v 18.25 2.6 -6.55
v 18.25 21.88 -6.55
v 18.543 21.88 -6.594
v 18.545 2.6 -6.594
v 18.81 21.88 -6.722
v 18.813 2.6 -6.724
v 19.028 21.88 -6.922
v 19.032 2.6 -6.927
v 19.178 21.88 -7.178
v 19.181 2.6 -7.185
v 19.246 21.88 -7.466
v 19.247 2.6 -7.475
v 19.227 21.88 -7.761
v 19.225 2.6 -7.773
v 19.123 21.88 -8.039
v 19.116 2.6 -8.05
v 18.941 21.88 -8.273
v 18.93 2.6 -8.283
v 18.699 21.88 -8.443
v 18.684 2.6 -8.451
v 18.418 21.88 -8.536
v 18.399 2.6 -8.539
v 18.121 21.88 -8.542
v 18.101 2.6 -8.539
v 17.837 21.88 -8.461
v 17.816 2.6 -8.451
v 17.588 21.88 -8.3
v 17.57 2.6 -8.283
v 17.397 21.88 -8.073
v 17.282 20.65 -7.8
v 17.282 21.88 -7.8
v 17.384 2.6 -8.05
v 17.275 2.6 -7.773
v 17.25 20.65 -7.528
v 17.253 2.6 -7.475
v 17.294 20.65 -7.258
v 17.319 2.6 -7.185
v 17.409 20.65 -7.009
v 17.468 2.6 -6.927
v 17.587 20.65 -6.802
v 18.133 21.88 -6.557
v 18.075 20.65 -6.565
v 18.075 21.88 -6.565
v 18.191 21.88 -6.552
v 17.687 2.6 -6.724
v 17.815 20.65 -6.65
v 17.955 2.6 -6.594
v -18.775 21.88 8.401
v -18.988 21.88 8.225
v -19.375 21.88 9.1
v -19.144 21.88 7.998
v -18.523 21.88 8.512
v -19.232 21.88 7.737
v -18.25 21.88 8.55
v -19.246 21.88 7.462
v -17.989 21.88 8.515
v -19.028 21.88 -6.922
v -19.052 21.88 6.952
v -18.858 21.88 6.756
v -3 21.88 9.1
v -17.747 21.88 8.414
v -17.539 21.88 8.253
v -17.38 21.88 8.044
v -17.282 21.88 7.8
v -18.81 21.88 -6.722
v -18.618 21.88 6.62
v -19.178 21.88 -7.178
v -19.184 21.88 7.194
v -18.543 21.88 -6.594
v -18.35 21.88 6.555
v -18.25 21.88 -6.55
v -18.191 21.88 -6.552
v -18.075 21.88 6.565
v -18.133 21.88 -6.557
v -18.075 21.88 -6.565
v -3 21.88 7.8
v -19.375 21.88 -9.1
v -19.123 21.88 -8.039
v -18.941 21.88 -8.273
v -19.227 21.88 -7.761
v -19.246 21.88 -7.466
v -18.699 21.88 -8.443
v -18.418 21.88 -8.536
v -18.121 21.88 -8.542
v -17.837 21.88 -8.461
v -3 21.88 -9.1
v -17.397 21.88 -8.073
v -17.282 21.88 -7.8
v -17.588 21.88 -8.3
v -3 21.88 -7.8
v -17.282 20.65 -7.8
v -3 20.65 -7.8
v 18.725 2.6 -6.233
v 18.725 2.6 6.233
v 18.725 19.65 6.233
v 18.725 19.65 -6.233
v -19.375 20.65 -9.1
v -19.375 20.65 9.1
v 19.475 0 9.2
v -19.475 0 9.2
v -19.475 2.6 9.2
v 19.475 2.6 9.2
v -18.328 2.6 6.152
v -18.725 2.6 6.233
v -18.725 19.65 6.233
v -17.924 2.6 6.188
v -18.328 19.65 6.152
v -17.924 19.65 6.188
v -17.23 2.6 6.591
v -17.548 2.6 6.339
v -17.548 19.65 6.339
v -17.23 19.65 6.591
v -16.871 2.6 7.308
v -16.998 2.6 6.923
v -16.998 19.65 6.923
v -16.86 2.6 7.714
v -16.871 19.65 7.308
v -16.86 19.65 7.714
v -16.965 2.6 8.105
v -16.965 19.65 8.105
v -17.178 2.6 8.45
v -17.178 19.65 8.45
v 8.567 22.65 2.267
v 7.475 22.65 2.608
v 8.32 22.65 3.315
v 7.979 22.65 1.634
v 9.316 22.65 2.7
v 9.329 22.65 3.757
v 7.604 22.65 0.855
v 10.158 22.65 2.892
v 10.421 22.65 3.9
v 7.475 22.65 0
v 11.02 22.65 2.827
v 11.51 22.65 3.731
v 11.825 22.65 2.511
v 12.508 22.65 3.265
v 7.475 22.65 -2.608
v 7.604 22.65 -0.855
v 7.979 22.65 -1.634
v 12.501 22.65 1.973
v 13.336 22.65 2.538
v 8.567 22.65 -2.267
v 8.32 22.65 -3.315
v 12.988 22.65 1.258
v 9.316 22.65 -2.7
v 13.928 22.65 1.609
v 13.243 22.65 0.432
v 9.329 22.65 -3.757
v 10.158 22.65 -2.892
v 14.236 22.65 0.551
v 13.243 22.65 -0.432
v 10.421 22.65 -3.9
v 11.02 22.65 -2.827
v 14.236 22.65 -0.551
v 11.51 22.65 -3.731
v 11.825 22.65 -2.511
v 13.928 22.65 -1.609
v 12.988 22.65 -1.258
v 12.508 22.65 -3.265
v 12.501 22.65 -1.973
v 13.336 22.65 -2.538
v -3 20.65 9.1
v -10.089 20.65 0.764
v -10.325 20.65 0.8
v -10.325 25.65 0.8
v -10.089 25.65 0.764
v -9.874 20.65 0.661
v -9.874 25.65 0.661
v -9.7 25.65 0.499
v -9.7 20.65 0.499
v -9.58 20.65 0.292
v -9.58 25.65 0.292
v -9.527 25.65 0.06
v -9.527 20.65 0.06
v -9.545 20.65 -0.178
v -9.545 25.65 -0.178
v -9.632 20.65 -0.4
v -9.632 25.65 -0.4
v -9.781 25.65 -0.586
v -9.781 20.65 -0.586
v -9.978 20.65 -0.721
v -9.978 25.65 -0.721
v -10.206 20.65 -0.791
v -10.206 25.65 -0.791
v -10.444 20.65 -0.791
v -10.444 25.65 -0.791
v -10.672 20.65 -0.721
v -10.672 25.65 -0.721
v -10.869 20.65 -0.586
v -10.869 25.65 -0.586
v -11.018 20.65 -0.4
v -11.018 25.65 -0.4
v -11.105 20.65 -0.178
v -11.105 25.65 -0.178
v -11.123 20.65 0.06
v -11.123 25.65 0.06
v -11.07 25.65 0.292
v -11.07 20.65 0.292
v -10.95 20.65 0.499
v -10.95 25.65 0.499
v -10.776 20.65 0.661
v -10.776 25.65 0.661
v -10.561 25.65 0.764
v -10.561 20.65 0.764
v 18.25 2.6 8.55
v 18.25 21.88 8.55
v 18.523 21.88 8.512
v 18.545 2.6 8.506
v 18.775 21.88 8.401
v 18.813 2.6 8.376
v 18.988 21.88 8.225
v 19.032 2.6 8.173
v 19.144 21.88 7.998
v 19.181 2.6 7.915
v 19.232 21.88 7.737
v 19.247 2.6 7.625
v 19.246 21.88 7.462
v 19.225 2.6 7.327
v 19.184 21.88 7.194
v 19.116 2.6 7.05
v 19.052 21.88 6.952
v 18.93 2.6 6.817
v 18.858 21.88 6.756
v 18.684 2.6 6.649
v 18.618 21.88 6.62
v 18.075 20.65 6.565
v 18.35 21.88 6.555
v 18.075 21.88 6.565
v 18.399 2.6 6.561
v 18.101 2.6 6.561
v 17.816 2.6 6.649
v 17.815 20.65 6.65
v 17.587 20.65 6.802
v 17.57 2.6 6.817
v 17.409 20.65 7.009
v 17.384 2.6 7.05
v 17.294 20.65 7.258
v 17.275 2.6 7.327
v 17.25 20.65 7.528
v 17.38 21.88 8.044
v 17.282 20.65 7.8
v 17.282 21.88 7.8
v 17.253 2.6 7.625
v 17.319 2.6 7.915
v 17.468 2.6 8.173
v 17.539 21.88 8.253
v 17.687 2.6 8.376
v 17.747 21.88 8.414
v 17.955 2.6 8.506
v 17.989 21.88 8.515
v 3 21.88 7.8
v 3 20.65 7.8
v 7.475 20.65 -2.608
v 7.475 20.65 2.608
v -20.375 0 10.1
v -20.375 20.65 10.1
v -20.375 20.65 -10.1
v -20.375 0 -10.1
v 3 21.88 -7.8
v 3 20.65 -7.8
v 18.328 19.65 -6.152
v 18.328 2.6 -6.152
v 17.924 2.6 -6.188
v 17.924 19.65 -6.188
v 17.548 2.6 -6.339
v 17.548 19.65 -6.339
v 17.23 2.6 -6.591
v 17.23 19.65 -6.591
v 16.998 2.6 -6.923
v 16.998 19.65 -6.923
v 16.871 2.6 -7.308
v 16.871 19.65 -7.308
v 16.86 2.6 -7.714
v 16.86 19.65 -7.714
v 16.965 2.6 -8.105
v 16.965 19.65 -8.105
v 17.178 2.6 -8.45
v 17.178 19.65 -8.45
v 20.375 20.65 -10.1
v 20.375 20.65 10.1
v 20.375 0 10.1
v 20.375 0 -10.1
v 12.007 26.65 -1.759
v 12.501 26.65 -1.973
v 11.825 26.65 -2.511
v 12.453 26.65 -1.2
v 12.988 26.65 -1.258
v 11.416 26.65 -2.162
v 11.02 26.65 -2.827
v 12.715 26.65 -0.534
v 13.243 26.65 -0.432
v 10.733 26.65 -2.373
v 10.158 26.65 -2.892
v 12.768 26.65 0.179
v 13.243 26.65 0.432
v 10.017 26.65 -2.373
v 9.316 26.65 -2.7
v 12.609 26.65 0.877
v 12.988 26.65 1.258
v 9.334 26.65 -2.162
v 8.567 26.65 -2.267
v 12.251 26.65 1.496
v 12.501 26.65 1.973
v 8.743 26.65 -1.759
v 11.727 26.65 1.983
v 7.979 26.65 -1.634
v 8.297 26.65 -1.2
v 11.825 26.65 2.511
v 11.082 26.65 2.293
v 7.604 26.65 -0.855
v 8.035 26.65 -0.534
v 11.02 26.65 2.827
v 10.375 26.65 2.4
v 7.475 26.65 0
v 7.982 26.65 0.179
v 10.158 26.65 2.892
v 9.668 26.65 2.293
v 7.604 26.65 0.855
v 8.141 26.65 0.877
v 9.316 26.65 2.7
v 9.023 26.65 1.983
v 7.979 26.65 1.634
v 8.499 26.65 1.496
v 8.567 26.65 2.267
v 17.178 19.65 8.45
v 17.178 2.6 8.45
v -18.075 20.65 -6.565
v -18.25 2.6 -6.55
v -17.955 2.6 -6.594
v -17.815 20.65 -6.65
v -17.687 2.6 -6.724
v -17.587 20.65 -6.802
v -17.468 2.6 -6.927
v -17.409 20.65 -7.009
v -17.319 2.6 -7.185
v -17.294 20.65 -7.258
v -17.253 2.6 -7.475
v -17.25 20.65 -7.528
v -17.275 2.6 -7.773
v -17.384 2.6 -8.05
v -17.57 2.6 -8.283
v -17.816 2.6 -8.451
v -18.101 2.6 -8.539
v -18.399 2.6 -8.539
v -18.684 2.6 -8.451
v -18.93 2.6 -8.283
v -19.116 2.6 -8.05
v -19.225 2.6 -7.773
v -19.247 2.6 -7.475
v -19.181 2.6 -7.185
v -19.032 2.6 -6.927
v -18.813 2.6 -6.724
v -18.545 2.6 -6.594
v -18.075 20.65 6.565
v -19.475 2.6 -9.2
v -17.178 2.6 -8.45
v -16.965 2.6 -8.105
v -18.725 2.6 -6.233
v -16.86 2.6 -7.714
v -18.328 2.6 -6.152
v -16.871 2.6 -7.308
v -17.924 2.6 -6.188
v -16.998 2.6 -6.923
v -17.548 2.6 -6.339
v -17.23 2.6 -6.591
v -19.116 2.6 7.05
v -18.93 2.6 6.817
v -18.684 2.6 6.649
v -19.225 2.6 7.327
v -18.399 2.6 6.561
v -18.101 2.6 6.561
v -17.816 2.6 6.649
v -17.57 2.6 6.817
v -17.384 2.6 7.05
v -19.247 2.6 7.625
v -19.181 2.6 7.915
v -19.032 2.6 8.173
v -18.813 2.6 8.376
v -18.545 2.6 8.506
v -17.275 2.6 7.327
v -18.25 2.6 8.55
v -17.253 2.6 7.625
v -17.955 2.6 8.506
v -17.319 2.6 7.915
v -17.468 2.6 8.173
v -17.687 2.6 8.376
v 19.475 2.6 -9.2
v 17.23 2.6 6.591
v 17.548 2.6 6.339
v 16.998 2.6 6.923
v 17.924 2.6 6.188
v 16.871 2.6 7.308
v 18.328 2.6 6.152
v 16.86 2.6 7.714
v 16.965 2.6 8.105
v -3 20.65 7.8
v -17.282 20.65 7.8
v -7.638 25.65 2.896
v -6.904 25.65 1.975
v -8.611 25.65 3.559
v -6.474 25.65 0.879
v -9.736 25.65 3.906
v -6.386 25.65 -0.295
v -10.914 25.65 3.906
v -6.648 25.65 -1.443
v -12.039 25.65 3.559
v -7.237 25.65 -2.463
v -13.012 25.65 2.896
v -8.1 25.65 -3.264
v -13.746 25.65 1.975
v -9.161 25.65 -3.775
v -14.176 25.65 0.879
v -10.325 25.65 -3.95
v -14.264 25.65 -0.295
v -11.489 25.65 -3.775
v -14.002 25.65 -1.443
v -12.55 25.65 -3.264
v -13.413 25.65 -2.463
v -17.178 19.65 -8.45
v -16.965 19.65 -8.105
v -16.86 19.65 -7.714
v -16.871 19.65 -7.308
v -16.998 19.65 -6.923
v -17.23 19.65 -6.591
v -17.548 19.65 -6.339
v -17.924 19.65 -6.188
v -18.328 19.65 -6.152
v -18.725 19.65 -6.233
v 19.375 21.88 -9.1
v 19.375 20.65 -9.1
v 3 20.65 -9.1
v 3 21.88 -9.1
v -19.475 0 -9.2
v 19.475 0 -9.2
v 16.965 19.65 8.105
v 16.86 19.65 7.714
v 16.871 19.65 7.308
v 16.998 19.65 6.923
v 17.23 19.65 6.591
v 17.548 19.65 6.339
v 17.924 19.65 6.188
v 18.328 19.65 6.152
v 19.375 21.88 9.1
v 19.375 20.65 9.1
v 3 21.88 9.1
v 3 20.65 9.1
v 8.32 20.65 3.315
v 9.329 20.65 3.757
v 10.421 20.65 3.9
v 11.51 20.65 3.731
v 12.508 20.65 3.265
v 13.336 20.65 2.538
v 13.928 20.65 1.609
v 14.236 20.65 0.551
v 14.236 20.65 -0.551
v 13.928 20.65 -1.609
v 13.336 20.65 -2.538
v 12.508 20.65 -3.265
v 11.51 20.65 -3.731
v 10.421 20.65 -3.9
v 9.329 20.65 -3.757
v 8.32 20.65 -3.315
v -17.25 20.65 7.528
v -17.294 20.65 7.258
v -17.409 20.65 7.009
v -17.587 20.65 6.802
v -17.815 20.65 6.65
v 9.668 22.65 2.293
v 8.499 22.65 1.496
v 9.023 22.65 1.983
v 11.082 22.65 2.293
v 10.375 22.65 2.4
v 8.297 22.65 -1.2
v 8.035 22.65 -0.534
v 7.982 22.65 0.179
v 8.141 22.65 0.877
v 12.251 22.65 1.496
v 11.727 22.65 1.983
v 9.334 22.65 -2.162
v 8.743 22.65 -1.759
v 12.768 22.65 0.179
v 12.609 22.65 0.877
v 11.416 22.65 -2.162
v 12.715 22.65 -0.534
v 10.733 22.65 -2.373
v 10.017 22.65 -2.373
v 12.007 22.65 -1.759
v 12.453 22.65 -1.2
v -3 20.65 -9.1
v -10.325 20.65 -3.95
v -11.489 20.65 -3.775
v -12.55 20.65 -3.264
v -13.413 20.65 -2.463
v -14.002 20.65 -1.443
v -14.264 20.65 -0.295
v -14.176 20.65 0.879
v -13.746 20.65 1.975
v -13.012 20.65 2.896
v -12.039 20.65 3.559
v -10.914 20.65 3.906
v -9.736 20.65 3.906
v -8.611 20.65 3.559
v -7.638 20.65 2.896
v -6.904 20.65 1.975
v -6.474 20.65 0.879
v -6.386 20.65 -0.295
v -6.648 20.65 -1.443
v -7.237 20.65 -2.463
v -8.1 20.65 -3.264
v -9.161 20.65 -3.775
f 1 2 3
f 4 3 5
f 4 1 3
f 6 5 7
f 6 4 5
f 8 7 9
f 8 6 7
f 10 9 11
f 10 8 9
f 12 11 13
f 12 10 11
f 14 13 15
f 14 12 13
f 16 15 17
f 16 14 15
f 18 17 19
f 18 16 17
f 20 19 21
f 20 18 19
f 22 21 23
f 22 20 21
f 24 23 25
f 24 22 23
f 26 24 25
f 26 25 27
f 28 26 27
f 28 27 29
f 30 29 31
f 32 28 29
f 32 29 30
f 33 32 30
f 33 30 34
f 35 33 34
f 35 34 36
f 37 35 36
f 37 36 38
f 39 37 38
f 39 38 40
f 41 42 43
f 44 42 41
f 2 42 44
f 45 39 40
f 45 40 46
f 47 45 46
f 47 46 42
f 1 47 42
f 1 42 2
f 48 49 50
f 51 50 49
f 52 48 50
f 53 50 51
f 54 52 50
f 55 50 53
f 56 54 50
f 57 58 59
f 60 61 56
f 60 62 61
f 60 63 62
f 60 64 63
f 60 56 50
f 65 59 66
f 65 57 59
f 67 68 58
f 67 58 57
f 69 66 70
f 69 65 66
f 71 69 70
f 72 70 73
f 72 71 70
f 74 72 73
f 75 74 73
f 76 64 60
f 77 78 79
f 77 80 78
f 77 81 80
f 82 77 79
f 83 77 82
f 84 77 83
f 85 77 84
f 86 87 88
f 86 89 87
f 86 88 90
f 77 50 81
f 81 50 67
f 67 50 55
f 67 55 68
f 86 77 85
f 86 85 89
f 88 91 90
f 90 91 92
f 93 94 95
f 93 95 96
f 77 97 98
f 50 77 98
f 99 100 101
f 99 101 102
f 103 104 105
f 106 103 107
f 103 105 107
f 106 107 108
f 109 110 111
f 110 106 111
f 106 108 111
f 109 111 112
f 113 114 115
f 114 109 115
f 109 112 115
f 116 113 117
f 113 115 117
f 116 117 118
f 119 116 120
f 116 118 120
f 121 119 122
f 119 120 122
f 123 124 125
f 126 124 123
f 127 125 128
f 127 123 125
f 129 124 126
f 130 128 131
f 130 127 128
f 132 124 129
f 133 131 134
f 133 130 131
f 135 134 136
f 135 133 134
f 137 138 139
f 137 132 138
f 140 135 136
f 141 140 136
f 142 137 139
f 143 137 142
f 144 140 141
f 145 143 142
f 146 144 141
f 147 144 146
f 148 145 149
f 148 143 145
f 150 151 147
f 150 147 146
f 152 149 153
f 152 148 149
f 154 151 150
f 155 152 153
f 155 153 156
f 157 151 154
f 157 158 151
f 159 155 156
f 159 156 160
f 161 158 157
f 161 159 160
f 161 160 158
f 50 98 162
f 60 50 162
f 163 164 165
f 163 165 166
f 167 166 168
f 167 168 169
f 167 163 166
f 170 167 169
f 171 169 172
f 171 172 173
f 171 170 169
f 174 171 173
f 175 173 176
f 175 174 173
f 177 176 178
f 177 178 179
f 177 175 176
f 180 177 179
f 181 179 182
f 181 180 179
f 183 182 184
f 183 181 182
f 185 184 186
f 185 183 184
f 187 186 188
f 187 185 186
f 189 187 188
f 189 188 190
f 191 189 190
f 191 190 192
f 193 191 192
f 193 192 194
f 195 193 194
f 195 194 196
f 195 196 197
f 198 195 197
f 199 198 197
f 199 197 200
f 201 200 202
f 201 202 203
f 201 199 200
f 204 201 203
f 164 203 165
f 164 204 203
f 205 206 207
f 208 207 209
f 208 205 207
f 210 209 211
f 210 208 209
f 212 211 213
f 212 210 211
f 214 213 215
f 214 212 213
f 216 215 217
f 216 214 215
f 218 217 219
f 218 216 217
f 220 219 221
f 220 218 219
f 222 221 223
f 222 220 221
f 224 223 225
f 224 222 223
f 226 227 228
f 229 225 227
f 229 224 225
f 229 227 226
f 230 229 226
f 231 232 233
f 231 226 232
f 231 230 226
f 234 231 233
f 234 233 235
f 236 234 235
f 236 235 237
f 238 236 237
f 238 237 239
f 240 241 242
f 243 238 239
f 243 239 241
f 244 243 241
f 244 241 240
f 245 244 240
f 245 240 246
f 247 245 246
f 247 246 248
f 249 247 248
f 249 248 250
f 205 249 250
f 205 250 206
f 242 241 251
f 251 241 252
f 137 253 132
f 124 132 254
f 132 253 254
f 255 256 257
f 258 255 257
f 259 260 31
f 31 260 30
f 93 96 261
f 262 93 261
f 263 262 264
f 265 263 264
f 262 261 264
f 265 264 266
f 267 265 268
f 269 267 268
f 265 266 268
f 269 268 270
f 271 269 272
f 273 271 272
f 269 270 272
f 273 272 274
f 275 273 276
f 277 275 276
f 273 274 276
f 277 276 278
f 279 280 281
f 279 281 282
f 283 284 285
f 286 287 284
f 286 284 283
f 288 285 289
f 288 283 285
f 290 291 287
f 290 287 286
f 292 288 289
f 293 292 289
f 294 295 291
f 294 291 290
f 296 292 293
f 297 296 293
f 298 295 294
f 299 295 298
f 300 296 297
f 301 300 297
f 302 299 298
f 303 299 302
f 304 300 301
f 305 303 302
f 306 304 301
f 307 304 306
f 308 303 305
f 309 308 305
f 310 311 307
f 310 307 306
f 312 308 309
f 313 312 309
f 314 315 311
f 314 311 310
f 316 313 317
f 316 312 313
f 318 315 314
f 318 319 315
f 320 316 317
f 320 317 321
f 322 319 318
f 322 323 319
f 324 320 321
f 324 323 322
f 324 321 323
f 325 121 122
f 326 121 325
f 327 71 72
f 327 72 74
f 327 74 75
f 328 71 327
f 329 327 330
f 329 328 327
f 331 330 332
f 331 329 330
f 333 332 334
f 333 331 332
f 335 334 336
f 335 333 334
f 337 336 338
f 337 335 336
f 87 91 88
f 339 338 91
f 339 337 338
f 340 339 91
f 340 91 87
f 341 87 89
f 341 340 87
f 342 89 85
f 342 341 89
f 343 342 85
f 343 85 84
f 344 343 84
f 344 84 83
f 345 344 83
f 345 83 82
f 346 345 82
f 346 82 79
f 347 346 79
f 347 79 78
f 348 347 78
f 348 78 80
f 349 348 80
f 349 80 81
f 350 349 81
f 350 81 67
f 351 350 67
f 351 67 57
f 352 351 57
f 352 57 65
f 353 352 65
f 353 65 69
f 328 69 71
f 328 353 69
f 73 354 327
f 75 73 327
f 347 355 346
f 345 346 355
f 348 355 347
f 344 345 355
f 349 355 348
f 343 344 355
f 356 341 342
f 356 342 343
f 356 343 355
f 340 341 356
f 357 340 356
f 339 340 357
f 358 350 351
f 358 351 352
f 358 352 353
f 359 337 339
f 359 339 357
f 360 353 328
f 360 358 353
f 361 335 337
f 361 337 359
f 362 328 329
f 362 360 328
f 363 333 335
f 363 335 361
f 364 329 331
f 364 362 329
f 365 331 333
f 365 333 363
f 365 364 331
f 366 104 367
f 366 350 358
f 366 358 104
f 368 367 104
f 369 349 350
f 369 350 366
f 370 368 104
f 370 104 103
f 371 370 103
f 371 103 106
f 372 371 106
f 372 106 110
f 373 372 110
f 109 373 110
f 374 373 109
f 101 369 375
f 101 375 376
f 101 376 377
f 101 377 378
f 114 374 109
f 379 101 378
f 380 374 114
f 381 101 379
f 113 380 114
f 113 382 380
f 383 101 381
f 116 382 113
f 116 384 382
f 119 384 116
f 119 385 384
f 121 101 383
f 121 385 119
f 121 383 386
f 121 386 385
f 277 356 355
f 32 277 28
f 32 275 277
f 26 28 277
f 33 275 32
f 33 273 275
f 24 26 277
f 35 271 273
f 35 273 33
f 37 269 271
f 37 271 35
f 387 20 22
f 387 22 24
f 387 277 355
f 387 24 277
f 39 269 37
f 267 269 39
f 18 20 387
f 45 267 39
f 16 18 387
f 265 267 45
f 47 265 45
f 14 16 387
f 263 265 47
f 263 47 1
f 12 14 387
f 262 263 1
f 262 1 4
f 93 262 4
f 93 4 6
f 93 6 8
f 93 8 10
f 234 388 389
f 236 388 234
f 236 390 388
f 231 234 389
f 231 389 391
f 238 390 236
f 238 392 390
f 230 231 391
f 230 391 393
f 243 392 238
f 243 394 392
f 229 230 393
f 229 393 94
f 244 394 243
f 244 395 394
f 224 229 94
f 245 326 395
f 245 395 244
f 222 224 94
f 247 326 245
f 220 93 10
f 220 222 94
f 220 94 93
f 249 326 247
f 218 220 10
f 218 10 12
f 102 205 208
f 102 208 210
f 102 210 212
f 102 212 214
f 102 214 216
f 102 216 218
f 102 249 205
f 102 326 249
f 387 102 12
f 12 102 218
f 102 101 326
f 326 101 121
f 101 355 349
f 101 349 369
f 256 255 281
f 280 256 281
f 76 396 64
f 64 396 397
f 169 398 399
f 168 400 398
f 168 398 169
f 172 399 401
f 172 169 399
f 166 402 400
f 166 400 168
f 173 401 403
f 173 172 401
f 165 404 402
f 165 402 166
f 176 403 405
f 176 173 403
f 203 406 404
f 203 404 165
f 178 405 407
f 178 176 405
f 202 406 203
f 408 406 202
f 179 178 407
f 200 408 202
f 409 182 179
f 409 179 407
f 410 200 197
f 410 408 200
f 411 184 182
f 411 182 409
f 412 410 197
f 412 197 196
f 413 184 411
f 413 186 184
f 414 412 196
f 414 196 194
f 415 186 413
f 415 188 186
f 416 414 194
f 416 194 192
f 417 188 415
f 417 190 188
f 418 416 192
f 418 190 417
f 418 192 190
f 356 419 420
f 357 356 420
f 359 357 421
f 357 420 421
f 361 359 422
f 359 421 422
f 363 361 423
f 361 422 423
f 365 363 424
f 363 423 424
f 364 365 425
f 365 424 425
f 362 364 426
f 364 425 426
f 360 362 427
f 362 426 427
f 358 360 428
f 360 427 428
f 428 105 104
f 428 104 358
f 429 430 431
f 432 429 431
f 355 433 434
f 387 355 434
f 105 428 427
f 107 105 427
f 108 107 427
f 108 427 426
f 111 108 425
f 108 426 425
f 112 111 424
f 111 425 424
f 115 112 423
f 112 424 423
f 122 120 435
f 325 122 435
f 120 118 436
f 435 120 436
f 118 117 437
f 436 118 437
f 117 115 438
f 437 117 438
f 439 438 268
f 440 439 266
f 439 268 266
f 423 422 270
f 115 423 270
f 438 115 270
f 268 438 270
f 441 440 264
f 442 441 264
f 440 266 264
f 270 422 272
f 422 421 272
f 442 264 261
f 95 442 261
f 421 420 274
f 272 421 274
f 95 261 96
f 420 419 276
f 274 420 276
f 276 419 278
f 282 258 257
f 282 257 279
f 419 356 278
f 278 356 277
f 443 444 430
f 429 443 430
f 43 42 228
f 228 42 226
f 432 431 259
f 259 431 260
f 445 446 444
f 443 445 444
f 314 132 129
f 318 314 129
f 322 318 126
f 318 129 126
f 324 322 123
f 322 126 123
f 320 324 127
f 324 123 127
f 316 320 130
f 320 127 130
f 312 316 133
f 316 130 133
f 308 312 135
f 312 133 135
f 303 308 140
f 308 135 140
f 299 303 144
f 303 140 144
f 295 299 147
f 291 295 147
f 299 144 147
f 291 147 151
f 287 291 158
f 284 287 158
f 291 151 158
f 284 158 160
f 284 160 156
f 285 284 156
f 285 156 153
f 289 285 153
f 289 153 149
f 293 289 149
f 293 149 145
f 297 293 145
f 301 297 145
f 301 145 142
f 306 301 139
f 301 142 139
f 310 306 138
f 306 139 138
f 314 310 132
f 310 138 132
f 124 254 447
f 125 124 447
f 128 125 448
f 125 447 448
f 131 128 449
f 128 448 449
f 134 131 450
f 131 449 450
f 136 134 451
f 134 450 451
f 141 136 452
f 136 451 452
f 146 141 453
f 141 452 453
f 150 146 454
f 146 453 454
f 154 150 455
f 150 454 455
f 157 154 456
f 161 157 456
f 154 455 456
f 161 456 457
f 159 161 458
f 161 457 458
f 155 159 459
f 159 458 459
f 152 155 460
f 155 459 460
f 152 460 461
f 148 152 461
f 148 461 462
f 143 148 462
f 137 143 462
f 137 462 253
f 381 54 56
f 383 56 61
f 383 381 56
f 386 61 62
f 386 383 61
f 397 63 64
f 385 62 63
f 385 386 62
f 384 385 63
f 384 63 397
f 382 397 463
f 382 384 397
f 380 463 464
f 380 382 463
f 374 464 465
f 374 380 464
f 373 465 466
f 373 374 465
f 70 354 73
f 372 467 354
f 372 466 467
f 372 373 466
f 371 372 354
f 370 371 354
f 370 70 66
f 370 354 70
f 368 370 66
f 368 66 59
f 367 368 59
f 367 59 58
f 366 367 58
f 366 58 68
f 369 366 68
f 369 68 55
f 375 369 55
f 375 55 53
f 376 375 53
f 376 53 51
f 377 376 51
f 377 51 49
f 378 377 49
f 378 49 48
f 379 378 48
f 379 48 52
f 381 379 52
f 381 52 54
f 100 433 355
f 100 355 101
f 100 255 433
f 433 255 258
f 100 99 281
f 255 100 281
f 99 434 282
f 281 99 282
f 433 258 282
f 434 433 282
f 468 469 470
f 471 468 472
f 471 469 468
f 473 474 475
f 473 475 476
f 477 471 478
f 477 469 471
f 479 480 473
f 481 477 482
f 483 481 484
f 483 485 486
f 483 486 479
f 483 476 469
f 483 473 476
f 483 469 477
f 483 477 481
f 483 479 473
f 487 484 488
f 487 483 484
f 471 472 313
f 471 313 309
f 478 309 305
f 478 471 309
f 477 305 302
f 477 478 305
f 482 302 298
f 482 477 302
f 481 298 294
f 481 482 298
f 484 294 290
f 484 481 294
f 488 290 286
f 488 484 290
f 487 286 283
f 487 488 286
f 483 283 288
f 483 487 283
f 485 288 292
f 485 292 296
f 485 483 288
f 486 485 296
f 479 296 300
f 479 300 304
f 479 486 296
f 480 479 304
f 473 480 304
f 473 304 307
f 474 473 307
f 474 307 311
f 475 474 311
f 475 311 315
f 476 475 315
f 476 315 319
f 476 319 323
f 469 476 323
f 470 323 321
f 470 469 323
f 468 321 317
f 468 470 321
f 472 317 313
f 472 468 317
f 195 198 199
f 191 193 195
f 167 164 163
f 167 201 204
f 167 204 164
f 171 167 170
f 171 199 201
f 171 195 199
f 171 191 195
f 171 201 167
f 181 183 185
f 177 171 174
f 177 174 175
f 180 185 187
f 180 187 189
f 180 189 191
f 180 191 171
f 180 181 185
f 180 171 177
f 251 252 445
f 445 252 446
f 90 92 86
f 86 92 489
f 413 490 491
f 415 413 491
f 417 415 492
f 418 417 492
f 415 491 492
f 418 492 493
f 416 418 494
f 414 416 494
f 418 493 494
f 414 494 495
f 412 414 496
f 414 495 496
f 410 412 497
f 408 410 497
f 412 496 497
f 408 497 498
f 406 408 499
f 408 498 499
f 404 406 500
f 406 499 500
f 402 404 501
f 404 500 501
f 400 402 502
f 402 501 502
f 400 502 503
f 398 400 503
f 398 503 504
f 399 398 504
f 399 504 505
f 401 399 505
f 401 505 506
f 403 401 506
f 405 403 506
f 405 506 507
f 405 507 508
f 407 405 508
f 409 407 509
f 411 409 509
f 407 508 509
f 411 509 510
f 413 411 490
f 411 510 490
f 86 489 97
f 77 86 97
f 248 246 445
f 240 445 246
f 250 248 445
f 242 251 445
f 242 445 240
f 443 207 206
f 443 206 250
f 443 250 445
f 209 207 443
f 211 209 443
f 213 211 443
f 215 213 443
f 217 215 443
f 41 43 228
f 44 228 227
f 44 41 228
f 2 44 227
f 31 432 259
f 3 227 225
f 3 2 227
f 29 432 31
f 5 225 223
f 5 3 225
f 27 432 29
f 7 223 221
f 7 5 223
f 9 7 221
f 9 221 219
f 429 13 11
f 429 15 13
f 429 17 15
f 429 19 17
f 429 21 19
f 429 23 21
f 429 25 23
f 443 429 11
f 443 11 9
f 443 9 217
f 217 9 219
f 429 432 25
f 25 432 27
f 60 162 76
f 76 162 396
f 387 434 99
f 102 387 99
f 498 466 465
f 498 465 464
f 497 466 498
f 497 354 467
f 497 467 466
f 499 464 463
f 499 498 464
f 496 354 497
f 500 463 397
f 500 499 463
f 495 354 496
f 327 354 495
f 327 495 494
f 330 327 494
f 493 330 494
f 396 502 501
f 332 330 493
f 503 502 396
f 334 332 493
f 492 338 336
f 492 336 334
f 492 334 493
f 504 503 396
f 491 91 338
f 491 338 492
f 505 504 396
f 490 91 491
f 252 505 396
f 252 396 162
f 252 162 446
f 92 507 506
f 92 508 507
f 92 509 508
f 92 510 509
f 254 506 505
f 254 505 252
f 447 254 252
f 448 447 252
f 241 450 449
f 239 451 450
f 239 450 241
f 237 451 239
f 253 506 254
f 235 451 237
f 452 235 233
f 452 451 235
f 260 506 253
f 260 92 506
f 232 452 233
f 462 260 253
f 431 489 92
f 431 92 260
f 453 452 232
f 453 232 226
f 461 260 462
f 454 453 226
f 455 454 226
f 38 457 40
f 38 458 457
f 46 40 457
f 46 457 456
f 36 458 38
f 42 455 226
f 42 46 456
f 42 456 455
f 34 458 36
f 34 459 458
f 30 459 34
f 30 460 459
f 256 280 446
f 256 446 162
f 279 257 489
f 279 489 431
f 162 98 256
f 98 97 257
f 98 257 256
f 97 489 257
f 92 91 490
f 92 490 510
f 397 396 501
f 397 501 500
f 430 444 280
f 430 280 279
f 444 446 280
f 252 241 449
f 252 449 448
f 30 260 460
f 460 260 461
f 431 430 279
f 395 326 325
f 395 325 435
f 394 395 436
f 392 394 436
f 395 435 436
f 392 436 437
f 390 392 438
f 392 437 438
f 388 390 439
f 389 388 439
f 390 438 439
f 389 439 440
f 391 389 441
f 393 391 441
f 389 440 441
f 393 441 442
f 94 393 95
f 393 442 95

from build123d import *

# Parameters (mm, degrees)
SKETCH_1_W          = 40.75
SKETCH_1_H          = 20.2
EXTRUDE_1_DEPTH     = 20.65
SHELL_1_T           = -1.65
SKETCH_2_W          = 40.75
SKETCH_2_H          = 20.2
EXTRUDE_2_DEPTH     = 1
EXTRUDE_3_DEPTH     = 1.23
SKETCH_4_R          = 3.95
SKETCH_4_R_2        = 0.8
EXTRUDE_4_DEPTH     = 5
EXTRUDE_5_DEPTH     = 2
SKETCH_6_R          = 2.9
SKETCH_6_R_2        = 2.4
EXTRUDE_6_DEPTH     = 4
SKETCH_7_W          = 38.95
SKETCH_7_H          = 18.4
CUT_EXTRUDE_2_DEPTH = 2.6
SKETCH_9_R          = 1.4
EXTRUDE_7_DEPTH     = 17.05
CUT_EXTRUDE_START   = -19.28
SKETCH_8_R          = 1
CUT_EXTRUDE_3_DEPTH = 19.28


with BuildPart() as part:
    # Эскиз1 → Бобышка-Вытянуть1 (new body)
    with BuildSketch(Plane(origin=(0, 0, 0), x_dir=(1, 0, 0), z_dir=(0, 1, 0))):
        Rectangle(SKETCH_1_W, SKETCH_1_H)
    extrude(amount=EXTRUDE_1_DEPTH)

    # Оболочка1
    shell_1_openings = [part.faces().sort_by_distance(p)[0] for p in [
        (0, 20.65, 0),
        (0, 0, 0),
    ]]
    offset(amount=SHELL_1_T, openings=shell_1_openings, kind=Kind.INTERSECTION)

    # Эскиз2 → Бобышка-Вытянуть2 (add)
    with BuildSketch(Plane(origin=(0, 20.65, 0), x_dir=(1, 0, 0), z_dir=(0, 1, 0))):
        Rectangle(SKETCH_2_W, SKETCH_2_H)
    extrude(amount=-EXTRUDE_2_DEPTH)

    # Эскиз3 → Бобышка-Вытянуть3 (add)
    with BuildSketch(Plane(origin=(0, 20.65, 0), x_dir=(1, 0, 0), z_dir=(0, 1, 0))):
        Polygon((-19.375, -9.1), (-3, -9.1), (-3, -7.8), (-18.075, -7.8), (-18.075, 7.8), (-3, 7.8), (-3, 9.1), (-19.375, 9.1), align=None)
        Polygon((19.375, -9.1), (19.375, 9.1), (3, 9.1), (3, 7.8), (18.075, 7.8), (18.075, -7.8), (3, -7.8), (3, -9.1), align=None)
    extrude(amount=EXTRUDE_3_DEPTH)

    # Эскиз4 → Бобышка-Вытянуть4 (add)
    with BuildSketch(Plane(origin=(0, 20.65, 0), x_dir=(1, 0, 0), z_dir=(0, 1, 0))):
        with Locations(Location((-10.325, 0, 0), (0, 0, 90))):
            Circle(SKETCH_4_R)
        with Locations(Location((-10.325, 0, 0), (0, 0, 270))):
            Circle(SKETCH_4_R_2, mode=Mode.SUBTRACT)
    extrude(amount=EXTRUDE_4_DEPTH)

    # Эскиз5 → Бобышка-Вытянуть5 (add)
    with BuildSketch(Plane(origin=(0, 20.65, 0), x_dir=(1, 0, 0), z_dir=(0, 1, 0))):
        with BuildLine():
            Line((7.475, 2.607680962), (7.475, -2.607680962))
            ThreePointArc((7.475, -2.607680962), (14.275, 0), (7.475, 2.607680962))
        make_face()
    extrude(amount=EXTRUDE_5_DEPTH)

    # Эскиз6 → Бобышка-Вытянуть6 (add)
    with BuildSketch(Plane(origin=(0, 22.65, 0), x_dir=(1, 0, 0), z_dir=(0, 1, 0))):
        with Locations(Location((10.375, 0, 0), (0, 0, 180))):
            Circle(SKETCH_6_R)
        with Locations(Location((10.375, 0, 0), (0, 0, 270))):
            Circle(SKETCH_6_R_2, mode=Mode.SUBTRACT)
    extrude(amount=EXTRUDE_6_DEPTH)

    # Эскиз7 → Вырез-Вытянуть2 (cut)
    with BuildSketch(Plane.XZ):
        Rectangle(SKETCH_7_W, SKETCH_7_H)
    extrude(amount=-CUT_EXTRUDE_2_DEPTH, mode=Mode.SUBTRACT)

    # Эскиз9 → Бобышка-Вытянуть7 (add)
    with BuildSketch(Plane.XZ.offset(-19.65)):
        with Locations((-18.25, 7.55)):
            Circle(SKETCH_9_R)
        with Locations((-18.25, -7.55)):
            Circle(SKETCH_9_R)
        with Locations((18.25, -7.55)):
            Circle(SKETCH_9_R)
        with Locations((18.25, 7.55)):
            Circle(SKETCH_9_R)
    extrude(amount=EXTRUDE_7_DEPTH)

    # Эскиз8 → Вырез-Вытянуть3 (cut)
    with BuildSketch(Plane(origin=(0, 21.88, 0), x_dir=(1, 0, 0), z_dir=(0, 1, 0)).offset(CUT_EXTRUDE_START)):
        with Locations(Location((-18.25, 7.55, 0), (0, 0, 270))):
            Circle(SKETCH_8_R)
        with Locations(Location((18.25, 7.55, 0), (0, 0, 270))):
            Circle(SKETCH_8_R)
        with Locations(Location((18.25, -7.55, 0), (0, 0, 270))):
            Circle(SKETCH_8_R)
        with Locations(Location((-18.25, -7.55, 0), (0, 0, 270))):
            Circle(SKETCH_8_R)
    extrude(amount=CUT_EXTRUDE_3_DEPTH, mode=Mode.SUBTRACT)


solid = part.part
